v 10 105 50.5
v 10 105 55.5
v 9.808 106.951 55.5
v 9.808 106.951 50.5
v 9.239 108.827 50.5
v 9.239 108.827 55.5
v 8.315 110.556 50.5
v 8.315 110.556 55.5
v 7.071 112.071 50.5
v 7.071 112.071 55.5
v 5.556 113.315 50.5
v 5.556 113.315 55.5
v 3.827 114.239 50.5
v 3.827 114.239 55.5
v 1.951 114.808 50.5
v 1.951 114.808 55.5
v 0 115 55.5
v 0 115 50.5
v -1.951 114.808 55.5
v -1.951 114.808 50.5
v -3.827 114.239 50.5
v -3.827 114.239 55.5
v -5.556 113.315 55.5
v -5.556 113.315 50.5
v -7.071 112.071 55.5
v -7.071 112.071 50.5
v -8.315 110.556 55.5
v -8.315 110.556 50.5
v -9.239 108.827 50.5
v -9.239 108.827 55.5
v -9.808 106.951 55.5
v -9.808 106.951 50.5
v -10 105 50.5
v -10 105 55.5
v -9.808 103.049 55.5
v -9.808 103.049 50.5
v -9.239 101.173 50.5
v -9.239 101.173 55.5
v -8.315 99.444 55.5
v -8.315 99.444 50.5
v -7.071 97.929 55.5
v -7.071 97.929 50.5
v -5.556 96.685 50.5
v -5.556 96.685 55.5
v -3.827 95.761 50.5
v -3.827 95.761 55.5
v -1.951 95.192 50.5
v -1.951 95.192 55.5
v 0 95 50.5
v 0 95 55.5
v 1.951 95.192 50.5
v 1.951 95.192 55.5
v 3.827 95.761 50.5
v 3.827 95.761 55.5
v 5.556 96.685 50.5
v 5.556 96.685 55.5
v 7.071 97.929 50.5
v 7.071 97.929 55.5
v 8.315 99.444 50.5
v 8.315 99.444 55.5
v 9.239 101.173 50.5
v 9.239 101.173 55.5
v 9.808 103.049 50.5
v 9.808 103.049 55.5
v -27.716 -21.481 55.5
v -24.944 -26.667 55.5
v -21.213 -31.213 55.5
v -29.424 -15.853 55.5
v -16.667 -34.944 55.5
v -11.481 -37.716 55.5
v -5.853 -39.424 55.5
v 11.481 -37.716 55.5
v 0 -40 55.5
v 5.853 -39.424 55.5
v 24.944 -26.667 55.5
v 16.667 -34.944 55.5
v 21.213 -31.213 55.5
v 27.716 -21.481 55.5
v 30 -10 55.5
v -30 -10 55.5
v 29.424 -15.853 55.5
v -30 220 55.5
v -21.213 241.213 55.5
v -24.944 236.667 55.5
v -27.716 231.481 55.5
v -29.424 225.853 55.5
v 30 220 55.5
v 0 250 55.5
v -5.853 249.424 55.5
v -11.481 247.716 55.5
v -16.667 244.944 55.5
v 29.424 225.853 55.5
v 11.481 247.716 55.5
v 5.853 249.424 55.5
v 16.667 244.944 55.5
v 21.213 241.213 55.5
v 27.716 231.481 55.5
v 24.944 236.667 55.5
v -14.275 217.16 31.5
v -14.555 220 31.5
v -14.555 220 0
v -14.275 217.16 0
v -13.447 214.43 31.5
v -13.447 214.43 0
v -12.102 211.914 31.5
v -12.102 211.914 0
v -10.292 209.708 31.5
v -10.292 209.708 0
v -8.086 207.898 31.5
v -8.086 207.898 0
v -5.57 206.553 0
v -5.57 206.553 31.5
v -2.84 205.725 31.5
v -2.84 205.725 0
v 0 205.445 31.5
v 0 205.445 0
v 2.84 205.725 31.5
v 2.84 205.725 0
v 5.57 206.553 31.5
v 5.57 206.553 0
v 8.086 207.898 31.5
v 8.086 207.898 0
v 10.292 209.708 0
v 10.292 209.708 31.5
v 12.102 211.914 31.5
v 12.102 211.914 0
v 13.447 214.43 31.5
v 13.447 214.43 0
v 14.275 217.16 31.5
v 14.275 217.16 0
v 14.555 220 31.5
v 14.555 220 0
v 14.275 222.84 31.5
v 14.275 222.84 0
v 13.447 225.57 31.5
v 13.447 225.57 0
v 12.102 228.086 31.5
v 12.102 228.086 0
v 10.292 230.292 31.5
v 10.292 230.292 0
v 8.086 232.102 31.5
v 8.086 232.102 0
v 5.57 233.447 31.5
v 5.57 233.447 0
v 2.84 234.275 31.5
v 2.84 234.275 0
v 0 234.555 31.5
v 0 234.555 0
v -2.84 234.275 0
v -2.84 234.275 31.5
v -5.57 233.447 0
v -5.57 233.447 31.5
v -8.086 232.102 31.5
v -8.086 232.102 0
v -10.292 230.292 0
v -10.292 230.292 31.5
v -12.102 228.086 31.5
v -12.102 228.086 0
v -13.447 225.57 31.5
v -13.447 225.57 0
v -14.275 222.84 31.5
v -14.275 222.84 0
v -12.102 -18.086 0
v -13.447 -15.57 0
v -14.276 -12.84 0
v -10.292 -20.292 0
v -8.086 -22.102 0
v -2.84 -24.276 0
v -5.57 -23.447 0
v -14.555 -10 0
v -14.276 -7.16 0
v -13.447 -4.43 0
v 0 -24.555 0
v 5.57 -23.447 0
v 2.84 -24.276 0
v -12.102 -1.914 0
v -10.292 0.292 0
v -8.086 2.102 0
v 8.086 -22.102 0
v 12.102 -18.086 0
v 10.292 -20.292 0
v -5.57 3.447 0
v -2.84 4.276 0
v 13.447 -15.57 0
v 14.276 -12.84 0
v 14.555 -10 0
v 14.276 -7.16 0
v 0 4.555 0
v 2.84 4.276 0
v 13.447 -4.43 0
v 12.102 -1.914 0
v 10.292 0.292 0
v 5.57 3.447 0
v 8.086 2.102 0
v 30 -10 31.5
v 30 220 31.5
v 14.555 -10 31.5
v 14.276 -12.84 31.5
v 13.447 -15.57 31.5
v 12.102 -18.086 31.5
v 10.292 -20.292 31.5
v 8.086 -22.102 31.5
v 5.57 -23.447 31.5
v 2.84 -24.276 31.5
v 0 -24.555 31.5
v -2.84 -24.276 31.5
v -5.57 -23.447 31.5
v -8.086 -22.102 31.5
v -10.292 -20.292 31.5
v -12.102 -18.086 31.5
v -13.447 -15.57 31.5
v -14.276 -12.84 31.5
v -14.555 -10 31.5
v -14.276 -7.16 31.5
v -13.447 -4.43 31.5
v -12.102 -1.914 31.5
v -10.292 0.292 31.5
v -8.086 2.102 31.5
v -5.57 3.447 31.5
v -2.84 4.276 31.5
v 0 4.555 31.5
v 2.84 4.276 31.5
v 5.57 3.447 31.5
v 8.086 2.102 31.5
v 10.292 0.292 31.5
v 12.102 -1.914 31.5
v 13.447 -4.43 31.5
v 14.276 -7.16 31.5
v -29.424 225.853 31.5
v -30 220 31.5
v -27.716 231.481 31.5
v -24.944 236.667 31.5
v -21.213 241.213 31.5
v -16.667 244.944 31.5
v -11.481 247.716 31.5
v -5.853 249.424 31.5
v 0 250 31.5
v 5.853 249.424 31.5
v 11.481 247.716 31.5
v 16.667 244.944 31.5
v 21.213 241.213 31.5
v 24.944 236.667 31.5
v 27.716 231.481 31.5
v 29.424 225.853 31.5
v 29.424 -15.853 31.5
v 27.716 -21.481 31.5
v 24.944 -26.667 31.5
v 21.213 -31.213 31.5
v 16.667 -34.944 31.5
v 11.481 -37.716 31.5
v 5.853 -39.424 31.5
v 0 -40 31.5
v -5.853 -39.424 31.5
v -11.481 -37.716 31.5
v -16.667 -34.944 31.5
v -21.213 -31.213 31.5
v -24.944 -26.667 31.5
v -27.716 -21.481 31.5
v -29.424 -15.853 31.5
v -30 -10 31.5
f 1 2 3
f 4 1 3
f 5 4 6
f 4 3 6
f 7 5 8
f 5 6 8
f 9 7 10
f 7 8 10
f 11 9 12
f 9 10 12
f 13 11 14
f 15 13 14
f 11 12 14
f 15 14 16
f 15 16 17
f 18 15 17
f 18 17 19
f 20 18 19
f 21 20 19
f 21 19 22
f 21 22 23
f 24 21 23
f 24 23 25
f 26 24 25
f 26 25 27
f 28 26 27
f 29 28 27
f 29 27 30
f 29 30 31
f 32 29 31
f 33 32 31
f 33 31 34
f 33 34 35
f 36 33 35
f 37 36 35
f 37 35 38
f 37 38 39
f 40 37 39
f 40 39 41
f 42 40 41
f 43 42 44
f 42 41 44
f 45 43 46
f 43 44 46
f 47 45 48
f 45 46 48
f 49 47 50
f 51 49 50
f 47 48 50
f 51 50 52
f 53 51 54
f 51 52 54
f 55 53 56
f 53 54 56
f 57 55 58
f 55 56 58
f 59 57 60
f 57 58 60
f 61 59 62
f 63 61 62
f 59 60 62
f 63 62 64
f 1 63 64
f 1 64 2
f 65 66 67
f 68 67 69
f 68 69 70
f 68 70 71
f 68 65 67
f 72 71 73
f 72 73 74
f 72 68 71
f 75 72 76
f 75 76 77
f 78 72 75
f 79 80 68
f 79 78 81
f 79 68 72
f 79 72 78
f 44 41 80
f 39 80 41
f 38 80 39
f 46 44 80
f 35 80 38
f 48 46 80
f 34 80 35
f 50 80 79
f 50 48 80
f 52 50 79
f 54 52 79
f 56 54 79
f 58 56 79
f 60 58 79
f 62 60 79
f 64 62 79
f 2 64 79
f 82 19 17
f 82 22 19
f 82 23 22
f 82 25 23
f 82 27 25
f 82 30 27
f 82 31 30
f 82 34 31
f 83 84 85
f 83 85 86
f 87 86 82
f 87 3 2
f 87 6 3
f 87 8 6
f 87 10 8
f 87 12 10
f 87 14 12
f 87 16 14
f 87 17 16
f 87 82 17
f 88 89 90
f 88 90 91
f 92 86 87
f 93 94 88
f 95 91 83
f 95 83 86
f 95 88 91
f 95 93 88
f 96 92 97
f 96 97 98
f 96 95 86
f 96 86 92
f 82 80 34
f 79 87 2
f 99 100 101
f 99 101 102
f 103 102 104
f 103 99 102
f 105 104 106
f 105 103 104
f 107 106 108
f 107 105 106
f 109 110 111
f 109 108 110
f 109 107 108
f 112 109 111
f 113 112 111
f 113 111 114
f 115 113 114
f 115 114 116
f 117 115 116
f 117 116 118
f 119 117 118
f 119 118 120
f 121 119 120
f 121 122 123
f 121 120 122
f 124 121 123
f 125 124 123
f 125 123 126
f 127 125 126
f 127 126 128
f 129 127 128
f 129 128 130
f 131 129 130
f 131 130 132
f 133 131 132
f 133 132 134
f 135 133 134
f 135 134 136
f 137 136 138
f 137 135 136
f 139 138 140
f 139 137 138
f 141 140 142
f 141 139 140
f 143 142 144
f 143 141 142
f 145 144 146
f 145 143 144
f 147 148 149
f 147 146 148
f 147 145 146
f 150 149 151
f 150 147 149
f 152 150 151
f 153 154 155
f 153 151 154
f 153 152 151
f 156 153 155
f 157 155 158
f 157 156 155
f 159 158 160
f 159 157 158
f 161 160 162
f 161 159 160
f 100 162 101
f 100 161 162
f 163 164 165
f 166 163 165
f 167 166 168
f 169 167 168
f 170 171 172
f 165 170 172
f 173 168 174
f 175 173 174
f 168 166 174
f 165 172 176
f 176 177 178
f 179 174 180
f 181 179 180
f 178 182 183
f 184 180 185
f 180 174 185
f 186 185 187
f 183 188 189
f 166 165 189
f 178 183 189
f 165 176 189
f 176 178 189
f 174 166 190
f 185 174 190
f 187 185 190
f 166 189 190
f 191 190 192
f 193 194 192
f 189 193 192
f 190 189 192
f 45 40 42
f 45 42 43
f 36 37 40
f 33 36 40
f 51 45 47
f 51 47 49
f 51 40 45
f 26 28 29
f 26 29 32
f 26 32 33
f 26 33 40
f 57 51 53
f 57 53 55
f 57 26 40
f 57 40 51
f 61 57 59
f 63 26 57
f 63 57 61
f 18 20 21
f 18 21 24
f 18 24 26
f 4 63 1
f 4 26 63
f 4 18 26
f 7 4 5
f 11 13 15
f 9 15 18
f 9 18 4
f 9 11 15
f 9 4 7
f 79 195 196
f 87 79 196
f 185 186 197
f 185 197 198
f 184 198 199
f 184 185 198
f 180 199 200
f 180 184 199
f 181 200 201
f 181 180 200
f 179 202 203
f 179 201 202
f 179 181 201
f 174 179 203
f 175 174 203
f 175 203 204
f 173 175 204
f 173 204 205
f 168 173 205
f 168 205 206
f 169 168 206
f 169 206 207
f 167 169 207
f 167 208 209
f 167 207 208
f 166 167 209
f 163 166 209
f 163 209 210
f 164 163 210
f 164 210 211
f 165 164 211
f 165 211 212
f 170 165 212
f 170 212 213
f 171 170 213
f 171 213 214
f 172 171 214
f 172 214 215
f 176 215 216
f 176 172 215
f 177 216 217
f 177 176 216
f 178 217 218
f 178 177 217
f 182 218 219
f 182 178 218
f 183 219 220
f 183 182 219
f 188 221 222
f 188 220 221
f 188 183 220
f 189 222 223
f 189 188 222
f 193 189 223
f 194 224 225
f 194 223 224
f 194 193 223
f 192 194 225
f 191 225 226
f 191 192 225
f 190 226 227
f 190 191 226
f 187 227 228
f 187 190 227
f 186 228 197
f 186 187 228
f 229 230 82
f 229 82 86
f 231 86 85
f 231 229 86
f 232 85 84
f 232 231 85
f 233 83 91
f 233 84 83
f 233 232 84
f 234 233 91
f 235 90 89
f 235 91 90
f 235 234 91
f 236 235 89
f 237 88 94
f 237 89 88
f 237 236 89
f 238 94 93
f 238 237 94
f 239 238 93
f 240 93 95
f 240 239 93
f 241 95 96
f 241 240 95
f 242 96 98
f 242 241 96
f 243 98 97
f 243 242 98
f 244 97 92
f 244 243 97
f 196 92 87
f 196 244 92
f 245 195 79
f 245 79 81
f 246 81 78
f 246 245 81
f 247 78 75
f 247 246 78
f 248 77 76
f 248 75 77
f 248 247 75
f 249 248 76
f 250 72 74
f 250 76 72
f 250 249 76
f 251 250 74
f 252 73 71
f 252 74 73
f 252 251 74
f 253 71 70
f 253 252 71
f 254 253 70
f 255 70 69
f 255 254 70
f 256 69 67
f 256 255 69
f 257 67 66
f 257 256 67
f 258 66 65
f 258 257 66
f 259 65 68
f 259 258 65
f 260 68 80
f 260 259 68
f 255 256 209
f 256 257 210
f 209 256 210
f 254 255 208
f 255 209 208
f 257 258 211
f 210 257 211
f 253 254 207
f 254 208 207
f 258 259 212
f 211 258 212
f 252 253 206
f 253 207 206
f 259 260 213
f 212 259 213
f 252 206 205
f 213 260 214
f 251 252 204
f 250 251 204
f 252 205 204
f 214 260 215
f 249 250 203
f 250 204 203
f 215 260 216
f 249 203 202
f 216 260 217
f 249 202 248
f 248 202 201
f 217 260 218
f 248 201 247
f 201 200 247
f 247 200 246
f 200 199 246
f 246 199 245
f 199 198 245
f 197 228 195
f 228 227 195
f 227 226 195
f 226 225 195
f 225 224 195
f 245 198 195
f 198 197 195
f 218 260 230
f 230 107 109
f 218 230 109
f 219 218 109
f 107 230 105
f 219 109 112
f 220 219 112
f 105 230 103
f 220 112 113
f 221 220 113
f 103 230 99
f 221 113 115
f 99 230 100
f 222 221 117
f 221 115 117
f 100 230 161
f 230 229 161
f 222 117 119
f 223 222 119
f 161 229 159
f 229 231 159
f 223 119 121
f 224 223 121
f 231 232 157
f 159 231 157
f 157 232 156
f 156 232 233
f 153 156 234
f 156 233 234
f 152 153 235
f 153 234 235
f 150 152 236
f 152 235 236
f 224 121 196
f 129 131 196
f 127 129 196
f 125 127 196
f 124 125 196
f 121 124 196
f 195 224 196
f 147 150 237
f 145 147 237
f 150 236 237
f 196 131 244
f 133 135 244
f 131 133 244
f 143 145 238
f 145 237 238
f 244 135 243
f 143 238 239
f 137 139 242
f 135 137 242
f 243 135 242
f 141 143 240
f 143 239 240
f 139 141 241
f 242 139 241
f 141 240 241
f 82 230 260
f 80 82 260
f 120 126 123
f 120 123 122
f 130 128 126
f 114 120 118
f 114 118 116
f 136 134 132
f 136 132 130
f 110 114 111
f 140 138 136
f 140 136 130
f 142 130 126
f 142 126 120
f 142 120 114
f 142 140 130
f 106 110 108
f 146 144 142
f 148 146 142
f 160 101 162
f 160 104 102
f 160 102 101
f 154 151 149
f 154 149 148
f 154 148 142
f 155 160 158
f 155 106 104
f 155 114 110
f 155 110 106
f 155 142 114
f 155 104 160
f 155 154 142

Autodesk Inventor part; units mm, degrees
ref_plane "YZ Plane" through (0, 0, 0) normal (1, 0, 0) x (0, 1, 0)
ref_plane "XZ Plane" through (0, 0, 0) normal (0, 1, 0) x (-1, 0, 0)
ref_plane "XY Plane" through (0, 0, 0) normal (0, 0, 1) x (1, 0, 0)
sketch "Эскиз1" plane through (0, 0, 0) normal (0, 0, 1) x (1, 0, 0)
  circle A0 centre (0, -10) radius 9 projected
  circle A1 centre (0, -10) radius 14.5552
  point P0 (0, 0)
extrude "Выдавливание1" add sketch "Эскиз1" along normal blind 31.5 contours A0 | A1
sketch "Эскиз2" plane through (0, -10, 31.5) normal (0, 0, 1) x (1, 0, 0)
  line L0 (0, 0) -> (0, 230) construction
  line L1 (30, 0) -> (30, 230)
  line L2 (-30, 230) -> (-30, 0)
  arc A0 (-30, 0) -> (30, 0) centre (0, 0) ccw
  arc A1 (30, 230) -> (-30, 230) centre (0, 230) ccw
  circle A2 centre (0, 0) radius 14.5552 projected
  point P0 (0, 10)
  point P1 (0, 115)
  dimension "d4" = 230
  dimension "d5" = 30
extrude "Выдавливание2" add sketch "Эскиз2" along normal blind 24 contours A0 L2 A1 L1 | A2
sketch "Эскиз3" plane through (0, -10, 31.5) normal (0, 0, -1) x (-1, 0, 0)
  circle A0 centre (0, 230) radius 14.555
  arc A1 (30, 230) -> (-30, 230) centre (0, 230) ccw projected
  point P0 (0, 10)
  dimension "d6" = 29.11
extrude "Выдавливание3" add sketch "Эскиз3" along normal up to surface (31.5 mm away)
sketch "Эскиз4" plane through (0, -10, 55.5) normal (0, 0, 1) x (1, 0, 0)
  arc A0 (30, 230) -> (-30, 230) centre (0, 230) ccw projected
  line L0 (-30, 230) -> (-30, 0) projected
  arc A1 (-30, 0) -> (30, 0) centre (0, 0) ccw projected
  line L1 (30, 0) -> (30, 230) projected
  circle A2 centre (0, 115) radius 10
  point P0 (0, 10)
  dimension "d9" = 20
extrude "Выдавливание4" cut sketch "Эскиз4" against normal blind 5 contours A2
properties part number "Колено"
